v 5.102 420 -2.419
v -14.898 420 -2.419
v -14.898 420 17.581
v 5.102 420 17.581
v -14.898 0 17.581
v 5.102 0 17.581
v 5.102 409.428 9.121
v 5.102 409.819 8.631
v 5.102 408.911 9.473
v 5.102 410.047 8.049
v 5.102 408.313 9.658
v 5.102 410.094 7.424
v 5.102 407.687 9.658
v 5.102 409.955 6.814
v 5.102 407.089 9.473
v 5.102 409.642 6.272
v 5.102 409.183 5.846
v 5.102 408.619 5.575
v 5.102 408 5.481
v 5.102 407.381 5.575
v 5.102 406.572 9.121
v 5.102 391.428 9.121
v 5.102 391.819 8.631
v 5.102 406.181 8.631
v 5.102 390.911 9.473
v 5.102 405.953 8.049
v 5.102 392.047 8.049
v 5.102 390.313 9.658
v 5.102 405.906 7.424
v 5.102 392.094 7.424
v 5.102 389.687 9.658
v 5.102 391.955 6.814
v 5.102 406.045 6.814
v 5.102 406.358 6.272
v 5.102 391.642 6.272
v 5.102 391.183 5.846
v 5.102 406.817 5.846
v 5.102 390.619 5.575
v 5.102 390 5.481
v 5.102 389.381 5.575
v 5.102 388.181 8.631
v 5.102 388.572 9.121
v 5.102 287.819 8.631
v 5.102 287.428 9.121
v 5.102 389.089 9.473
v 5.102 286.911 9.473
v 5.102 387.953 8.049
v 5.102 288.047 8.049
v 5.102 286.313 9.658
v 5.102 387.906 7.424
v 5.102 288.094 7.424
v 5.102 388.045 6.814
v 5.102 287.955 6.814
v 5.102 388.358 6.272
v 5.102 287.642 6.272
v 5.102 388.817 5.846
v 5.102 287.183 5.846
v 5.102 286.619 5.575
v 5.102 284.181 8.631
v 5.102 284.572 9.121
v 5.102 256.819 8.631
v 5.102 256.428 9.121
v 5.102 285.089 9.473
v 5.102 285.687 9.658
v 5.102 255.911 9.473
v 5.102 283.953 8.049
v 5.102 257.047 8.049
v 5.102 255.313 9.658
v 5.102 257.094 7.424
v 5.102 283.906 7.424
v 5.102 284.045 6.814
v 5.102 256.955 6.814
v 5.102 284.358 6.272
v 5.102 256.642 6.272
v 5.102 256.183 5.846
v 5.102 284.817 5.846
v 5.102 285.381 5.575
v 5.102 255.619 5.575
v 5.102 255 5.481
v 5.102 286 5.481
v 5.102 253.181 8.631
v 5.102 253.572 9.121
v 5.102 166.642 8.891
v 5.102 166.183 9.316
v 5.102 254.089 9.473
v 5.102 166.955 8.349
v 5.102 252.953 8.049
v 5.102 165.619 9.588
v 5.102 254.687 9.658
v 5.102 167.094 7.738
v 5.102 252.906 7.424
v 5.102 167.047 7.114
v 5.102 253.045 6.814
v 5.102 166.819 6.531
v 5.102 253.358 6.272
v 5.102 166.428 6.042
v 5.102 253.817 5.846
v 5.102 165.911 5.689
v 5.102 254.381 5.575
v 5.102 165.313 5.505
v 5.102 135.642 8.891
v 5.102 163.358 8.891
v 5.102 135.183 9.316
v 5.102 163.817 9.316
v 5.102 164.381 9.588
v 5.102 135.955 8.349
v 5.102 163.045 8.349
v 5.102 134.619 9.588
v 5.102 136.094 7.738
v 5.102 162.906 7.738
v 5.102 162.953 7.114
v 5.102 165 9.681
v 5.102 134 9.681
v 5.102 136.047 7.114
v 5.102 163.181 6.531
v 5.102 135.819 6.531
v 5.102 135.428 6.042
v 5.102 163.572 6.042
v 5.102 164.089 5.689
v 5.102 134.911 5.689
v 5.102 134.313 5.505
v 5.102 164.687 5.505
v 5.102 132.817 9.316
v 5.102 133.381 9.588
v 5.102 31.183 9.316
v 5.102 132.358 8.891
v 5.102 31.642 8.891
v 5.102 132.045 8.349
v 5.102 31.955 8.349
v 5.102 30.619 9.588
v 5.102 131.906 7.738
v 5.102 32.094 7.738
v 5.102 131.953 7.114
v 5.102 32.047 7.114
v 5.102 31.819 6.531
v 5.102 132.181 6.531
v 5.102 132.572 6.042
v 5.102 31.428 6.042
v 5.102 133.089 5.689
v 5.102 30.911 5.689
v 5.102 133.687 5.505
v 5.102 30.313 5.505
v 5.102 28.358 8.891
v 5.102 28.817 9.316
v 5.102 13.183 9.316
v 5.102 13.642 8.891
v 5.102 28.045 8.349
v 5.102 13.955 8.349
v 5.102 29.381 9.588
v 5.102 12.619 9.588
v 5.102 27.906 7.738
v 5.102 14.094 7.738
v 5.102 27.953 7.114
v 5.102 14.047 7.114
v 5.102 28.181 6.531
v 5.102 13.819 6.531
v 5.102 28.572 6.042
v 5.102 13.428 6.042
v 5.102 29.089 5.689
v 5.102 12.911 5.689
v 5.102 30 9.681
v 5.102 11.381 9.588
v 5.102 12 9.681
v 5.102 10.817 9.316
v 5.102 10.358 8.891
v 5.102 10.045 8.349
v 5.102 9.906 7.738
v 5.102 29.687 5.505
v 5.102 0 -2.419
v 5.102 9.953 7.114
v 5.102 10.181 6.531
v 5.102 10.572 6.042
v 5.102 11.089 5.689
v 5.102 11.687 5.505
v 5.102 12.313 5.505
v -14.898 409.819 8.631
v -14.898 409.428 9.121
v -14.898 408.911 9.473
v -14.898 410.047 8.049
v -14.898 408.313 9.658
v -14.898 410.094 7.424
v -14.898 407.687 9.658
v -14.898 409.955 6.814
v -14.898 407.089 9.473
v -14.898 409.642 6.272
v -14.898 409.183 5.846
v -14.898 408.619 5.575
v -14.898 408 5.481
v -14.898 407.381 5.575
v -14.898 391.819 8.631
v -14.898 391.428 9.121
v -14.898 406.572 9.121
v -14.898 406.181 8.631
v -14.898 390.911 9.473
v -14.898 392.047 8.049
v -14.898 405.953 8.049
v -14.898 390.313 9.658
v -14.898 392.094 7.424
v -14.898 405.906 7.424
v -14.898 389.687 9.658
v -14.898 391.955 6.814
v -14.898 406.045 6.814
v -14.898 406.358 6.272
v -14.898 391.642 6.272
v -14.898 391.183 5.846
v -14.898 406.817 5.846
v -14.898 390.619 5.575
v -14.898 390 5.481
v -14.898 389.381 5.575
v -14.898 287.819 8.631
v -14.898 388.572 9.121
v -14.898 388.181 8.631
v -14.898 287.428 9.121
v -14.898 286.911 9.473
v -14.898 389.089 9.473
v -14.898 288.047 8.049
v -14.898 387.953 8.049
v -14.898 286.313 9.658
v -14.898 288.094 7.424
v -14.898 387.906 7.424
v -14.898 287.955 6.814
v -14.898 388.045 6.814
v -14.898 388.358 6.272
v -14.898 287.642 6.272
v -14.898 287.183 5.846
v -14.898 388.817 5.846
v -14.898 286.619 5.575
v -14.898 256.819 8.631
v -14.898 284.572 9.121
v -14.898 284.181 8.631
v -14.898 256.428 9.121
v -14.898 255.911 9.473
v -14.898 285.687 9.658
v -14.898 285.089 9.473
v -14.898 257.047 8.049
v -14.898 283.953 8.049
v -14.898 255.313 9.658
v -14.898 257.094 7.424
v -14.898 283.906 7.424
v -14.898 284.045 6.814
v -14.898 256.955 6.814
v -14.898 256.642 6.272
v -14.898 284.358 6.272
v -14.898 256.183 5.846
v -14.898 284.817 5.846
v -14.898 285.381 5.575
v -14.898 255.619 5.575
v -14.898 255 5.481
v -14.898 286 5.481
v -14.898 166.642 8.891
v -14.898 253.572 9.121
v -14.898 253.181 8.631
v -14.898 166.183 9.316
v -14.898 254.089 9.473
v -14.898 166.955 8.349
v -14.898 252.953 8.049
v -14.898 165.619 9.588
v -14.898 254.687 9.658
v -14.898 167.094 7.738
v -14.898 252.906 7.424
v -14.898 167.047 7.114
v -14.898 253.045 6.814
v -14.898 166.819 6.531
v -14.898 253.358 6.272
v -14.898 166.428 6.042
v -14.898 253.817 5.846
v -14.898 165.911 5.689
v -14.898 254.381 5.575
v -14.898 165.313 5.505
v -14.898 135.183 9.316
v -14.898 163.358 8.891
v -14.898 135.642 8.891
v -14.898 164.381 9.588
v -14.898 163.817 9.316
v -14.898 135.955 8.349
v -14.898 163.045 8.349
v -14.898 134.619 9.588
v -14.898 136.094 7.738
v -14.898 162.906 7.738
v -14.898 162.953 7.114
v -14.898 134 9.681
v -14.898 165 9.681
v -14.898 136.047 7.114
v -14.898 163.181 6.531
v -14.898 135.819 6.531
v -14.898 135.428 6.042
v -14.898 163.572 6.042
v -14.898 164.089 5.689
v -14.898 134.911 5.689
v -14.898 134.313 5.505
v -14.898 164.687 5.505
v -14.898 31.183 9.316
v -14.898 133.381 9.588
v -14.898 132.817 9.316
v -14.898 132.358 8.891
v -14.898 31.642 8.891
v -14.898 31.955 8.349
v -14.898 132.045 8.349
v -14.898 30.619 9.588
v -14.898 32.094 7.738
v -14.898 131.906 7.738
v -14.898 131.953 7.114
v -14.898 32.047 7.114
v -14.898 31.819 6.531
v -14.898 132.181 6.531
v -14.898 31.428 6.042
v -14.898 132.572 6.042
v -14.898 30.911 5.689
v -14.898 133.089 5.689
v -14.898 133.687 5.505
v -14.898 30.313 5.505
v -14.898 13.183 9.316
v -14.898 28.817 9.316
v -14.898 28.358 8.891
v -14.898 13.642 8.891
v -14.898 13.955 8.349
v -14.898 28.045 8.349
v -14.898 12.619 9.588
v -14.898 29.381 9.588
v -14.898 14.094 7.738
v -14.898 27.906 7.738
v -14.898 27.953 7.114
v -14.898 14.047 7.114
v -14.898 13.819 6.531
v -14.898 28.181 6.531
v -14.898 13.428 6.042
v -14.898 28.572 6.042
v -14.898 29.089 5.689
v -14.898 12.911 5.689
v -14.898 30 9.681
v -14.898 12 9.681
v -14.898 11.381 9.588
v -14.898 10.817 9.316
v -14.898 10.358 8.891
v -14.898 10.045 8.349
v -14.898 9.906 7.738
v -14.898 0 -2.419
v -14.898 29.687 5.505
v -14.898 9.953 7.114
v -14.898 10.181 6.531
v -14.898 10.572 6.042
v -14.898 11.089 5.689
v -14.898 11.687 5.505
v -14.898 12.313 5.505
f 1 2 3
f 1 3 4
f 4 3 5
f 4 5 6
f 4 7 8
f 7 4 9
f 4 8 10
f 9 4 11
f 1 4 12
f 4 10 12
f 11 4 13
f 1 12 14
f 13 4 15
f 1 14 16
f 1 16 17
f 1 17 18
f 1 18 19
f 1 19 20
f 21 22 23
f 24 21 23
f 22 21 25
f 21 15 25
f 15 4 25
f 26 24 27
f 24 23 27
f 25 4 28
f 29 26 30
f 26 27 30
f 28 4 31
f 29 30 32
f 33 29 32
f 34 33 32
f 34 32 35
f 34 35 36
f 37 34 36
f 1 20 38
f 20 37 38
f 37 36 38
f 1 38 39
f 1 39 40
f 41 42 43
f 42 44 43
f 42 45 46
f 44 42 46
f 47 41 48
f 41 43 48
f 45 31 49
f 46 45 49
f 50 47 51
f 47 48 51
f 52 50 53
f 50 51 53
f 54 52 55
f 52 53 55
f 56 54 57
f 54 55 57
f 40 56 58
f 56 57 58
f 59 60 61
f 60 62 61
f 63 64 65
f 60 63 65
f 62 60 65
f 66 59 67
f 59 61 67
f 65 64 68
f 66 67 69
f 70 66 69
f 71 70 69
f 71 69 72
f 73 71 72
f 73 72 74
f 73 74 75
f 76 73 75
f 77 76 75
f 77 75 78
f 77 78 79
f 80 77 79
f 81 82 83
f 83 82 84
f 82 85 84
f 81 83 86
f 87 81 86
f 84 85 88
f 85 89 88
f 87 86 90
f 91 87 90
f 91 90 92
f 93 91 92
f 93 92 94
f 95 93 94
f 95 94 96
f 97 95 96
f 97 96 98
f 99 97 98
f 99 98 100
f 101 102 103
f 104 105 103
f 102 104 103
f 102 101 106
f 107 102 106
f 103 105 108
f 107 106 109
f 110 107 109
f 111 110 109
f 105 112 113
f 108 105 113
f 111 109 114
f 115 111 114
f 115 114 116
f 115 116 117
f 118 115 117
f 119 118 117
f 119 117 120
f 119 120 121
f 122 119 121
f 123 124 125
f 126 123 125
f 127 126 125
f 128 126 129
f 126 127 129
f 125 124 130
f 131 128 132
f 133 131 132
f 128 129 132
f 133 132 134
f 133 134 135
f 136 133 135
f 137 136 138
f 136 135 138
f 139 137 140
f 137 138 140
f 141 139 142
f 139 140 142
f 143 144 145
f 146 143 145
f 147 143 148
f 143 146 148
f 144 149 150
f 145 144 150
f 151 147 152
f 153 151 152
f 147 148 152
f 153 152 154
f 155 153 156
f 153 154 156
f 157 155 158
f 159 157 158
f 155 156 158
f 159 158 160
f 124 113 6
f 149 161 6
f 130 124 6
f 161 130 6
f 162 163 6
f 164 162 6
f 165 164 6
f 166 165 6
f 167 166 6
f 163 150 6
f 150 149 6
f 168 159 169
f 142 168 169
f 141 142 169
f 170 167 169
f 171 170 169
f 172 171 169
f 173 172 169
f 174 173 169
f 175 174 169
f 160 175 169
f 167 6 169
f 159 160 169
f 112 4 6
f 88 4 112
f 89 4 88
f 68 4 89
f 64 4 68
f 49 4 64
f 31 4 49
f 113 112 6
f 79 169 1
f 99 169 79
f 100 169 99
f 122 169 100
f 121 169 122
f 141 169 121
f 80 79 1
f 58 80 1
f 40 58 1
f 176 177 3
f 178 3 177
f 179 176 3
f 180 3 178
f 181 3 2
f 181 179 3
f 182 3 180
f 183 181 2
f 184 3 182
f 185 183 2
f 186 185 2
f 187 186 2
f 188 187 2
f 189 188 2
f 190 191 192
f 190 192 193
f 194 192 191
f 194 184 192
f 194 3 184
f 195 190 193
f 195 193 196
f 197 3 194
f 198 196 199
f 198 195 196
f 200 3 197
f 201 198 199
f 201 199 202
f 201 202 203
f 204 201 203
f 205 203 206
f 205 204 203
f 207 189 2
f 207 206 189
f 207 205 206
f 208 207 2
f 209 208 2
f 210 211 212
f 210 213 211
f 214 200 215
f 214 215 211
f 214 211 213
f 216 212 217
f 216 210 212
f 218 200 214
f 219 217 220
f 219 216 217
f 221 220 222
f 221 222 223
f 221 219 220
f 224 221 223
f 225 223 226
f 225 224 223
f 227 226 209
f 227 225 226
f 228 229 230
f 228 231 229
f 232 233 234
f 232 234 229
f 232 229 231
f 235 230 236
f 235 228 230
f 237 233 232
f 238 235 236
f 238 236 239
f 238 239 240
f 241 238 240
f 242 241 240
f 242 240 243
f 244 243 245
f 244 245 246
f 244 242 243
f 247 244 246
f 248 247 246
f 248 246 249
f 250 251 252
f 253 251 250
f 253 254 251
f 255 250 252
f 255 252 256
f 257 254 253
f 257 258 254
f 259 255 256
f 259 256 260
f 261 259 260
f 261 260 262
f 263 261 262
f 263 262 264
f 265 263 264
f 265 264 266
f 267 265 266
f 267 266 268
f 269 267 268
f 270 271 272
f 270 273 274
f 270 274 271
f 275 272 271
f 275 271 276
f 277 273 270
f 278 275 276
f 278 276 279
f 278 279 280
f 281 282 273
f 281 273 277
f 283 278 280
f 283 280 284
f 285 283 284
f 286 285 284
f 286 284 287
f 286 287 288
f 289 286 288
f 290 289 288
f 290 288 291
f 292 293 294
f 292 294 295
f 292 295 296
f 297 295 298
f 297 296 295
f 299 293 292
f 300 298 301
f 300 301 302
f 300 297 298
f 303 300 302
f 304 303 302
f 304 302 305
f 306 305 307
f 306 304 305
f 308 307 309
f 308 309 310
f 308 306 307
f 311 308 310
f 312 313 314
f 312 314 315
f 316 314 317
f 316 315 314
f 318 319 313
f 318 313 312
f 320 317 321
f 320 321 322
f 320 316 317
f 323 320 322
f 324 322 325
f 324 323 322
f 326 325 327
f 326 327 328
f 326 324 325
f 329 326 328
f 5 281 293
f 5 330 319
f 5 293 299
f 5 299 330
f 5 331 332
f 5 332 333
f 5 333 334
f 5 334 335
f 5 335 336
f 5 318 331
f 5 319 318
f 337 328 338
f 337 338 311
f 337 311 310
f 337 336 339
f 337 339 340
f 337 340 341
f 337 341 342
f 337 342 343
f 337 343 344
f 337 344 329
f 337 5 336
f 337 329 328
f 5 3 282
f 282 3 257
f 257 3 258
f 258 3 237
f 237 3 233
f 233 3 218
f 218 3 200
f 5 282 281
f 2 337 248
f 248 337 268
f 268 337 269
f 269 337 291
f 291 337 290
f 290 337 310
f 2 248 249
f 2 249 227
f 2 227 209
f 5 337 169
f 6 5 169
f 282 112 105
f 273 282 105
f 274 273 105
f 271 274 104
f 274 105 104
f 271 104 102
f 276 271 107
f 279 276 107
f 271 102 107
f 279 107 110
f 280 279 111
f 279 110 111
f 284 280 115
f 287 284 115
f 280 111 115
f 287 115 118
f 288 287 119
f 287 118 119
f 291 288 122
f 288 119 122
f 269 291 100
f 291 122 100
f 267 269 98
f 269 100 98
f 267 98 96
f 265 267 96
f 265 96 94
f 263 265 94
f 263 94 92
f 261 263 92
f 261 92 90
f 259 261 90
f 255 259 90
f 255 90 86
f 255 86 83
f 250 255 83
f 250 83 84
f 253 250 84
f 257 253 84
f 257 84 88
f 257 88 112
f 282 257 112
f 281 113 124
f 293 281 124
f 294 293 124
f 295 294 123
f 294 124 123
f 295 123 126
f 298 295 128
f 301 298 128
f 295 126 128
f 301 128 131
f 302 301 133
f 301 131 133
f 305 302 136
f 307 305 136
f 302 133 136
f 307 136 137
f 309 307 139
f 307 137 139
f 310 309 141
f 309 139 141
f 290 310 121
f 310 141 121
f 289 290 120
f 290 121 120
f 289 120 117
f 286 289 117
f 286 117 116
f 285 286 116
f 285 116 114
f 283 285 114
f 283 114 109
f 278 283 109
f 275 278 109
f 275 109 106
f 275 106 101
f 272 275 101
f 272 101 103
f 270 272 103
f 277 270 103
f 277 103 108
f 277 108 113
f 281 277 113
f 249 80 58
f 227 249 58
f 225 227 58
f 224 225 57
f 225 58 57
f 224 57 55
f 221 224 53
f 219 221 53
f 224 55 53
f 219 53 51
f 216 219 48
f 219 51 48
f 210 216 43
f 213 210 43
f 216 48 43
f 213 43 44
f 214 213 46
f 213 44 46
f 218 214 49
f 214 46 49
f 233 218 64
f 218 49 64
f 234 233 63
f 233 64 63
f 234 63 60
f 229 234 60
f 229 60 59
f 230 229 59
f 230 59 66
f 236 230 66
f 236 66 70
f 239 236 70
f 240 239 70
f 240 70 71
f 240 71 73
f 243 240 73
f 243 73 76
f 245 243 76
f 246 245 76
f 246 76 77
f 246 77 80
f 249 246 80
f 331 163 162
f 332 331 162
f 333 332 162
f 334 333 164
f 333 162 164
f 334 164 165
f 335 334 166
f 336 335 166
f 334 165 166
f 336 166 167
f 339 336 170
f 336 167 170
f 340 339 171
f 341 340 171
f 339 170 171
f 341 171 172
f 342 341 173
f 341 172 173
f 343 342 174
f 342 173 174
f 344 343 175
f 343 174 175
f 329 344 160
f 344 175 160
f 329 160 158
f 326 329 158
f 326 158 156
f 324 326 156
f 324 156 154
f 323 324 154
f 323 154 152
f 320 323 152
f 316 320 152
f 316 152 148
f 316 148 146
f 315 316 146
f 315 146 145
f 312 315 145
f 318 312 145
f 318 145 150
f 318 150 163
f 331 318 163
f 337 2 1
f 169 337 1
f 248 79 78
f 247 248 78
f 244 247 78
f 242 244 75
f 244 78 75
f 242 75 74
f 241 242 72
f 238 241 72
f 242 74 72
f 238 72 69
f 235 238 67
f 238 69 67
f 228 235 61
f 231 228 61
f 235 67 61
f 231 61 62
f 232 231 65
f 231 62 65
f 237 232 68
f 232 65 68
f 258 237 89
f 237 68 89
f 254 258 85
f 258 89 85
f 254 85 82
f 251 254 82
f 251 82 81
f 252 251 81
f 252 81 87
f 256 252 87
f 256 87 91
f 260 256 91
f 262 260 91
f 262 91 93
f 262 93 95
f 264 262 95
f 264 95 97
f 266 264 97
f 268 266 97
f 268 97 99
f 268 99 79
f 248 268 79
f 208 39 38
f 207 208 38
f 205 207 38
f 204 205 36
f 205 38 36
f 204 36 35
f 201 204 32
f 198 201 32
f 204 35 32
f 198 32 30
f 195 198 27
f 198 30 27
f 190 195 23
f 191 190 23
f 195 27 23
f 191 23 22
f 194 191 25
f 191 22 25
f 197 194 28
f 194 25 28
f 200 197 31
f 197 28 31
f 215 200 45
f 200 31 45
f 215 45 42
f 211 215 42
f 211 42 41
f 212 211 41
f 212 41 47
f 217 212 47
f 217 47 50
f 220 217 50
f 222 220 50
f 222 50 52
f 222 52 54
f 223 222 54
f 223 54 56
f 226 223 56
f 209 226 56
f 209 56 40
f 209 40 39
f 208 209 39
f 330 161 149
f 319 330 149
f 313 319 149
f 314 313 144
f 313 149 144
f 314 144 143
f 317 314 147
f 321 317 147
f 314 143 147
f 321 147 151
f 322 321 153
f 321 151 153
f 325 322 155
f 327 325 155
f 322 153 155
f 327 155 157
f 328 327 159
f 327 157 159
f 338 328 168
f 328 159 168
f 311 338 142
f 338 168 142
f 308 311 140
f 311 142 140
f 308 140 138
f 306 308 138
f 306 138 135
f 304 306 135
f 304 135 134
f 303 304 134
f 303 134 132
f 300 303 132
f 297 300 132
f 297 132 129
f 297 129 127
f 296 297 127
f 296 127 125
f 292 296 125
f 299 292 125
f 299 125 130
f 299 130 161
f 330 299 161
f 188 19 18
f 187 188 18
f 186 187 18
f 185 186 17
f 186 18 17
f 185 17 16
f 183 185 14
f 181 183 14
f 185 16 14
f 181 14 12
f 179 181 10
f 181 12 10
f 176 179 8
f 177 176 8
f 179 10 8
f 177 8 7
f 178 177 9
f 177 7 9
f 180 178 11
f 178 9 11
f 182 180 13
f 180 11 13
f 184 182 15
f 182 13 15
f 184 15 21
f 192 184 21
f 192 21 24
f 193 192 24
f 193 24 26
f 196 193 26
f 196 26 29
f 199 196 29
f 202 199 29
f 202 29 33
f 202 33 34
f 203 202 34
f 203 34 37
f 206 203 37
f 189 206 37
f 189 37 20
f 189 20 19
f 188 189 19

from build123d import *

# Parameters (mm, degrees)
SKETCH_1_W          = 20
SKETCH_1_H          = 20
EXTRUDE_1_DEPTH     = 420
SKETCH_3_R          = 2.1
CUT_EXTRUDE_2_DEPTH = 421.843322554
SKETCH_4_R          = 2.1
CUT_EXTRUDE_3_DEPTH = 421.843322554


with BuildPart() as part:
    # 草图1 → 凸台-拉伸1 (new body)
    with BuildSketch(Plane(origin=(0, 0, 0), x_dir=(1, 0, 0), z_dir=(0, 1, 0))):
        with Locations((-4.898373984, -7.581300813)):
            Rectangle(SKETCH_1_W, SKETCH_1_H)
    extrude(amount=EXTRUDE_1_DEPTH)

    # 草图3 → 切除-拉伸2 (cut, through all)
    with BuildSketch(Plane(origin=(5.101626016, 0, 0), x_dir=(0, 0, -1), z_dir=(1, 0, 0))):
        with Locations((-7.581300813, 390)):
            Circle(SKETCH_3_R)
        with Locations((-7.581300813, 408)):
            Circle(SKETCH_3_R)
        with Locations(Location((-7.581300813, 30, 0), (0, 0, 180))):
            Circle(SKETCH_3_R)
        with Locations(Location((-7.581300813, 12, 0), (0, 0, 180))):
            Circle(SKETCH_3_R)
    extrude(amount=-CUT_EXTRUDE_2_DEPTH, mode=Mode.SUBTRACT)

    # 草图4 → 切除-拉伸3 (cut, through all)
    with BuildSketch(Plane(origin=(5.101626016, 0, 0), x_dir=(0, 0, -1), z_dir=(1, 0, 0))):
        with Locations((-7.581300813, 255)):
            Circle(SKETCH_4_R)
        with Locations((-7.581300813, 286)):
            Circle(SKETCH_4_R)
        with Locations(Location((-7.581300813, 134, 0), (0, 0, 180))):
            Circle(SKETCH_4_R)
        with Locations(Location((-7.581300813, 165, 0), (0, 0, 180))):
            Circle(SKETCH_4_R)
    extrude(amount=-CUT_EXTRUDE_3_DEPTH, mode=Mode.SUBTRACT)


solid = part.part
